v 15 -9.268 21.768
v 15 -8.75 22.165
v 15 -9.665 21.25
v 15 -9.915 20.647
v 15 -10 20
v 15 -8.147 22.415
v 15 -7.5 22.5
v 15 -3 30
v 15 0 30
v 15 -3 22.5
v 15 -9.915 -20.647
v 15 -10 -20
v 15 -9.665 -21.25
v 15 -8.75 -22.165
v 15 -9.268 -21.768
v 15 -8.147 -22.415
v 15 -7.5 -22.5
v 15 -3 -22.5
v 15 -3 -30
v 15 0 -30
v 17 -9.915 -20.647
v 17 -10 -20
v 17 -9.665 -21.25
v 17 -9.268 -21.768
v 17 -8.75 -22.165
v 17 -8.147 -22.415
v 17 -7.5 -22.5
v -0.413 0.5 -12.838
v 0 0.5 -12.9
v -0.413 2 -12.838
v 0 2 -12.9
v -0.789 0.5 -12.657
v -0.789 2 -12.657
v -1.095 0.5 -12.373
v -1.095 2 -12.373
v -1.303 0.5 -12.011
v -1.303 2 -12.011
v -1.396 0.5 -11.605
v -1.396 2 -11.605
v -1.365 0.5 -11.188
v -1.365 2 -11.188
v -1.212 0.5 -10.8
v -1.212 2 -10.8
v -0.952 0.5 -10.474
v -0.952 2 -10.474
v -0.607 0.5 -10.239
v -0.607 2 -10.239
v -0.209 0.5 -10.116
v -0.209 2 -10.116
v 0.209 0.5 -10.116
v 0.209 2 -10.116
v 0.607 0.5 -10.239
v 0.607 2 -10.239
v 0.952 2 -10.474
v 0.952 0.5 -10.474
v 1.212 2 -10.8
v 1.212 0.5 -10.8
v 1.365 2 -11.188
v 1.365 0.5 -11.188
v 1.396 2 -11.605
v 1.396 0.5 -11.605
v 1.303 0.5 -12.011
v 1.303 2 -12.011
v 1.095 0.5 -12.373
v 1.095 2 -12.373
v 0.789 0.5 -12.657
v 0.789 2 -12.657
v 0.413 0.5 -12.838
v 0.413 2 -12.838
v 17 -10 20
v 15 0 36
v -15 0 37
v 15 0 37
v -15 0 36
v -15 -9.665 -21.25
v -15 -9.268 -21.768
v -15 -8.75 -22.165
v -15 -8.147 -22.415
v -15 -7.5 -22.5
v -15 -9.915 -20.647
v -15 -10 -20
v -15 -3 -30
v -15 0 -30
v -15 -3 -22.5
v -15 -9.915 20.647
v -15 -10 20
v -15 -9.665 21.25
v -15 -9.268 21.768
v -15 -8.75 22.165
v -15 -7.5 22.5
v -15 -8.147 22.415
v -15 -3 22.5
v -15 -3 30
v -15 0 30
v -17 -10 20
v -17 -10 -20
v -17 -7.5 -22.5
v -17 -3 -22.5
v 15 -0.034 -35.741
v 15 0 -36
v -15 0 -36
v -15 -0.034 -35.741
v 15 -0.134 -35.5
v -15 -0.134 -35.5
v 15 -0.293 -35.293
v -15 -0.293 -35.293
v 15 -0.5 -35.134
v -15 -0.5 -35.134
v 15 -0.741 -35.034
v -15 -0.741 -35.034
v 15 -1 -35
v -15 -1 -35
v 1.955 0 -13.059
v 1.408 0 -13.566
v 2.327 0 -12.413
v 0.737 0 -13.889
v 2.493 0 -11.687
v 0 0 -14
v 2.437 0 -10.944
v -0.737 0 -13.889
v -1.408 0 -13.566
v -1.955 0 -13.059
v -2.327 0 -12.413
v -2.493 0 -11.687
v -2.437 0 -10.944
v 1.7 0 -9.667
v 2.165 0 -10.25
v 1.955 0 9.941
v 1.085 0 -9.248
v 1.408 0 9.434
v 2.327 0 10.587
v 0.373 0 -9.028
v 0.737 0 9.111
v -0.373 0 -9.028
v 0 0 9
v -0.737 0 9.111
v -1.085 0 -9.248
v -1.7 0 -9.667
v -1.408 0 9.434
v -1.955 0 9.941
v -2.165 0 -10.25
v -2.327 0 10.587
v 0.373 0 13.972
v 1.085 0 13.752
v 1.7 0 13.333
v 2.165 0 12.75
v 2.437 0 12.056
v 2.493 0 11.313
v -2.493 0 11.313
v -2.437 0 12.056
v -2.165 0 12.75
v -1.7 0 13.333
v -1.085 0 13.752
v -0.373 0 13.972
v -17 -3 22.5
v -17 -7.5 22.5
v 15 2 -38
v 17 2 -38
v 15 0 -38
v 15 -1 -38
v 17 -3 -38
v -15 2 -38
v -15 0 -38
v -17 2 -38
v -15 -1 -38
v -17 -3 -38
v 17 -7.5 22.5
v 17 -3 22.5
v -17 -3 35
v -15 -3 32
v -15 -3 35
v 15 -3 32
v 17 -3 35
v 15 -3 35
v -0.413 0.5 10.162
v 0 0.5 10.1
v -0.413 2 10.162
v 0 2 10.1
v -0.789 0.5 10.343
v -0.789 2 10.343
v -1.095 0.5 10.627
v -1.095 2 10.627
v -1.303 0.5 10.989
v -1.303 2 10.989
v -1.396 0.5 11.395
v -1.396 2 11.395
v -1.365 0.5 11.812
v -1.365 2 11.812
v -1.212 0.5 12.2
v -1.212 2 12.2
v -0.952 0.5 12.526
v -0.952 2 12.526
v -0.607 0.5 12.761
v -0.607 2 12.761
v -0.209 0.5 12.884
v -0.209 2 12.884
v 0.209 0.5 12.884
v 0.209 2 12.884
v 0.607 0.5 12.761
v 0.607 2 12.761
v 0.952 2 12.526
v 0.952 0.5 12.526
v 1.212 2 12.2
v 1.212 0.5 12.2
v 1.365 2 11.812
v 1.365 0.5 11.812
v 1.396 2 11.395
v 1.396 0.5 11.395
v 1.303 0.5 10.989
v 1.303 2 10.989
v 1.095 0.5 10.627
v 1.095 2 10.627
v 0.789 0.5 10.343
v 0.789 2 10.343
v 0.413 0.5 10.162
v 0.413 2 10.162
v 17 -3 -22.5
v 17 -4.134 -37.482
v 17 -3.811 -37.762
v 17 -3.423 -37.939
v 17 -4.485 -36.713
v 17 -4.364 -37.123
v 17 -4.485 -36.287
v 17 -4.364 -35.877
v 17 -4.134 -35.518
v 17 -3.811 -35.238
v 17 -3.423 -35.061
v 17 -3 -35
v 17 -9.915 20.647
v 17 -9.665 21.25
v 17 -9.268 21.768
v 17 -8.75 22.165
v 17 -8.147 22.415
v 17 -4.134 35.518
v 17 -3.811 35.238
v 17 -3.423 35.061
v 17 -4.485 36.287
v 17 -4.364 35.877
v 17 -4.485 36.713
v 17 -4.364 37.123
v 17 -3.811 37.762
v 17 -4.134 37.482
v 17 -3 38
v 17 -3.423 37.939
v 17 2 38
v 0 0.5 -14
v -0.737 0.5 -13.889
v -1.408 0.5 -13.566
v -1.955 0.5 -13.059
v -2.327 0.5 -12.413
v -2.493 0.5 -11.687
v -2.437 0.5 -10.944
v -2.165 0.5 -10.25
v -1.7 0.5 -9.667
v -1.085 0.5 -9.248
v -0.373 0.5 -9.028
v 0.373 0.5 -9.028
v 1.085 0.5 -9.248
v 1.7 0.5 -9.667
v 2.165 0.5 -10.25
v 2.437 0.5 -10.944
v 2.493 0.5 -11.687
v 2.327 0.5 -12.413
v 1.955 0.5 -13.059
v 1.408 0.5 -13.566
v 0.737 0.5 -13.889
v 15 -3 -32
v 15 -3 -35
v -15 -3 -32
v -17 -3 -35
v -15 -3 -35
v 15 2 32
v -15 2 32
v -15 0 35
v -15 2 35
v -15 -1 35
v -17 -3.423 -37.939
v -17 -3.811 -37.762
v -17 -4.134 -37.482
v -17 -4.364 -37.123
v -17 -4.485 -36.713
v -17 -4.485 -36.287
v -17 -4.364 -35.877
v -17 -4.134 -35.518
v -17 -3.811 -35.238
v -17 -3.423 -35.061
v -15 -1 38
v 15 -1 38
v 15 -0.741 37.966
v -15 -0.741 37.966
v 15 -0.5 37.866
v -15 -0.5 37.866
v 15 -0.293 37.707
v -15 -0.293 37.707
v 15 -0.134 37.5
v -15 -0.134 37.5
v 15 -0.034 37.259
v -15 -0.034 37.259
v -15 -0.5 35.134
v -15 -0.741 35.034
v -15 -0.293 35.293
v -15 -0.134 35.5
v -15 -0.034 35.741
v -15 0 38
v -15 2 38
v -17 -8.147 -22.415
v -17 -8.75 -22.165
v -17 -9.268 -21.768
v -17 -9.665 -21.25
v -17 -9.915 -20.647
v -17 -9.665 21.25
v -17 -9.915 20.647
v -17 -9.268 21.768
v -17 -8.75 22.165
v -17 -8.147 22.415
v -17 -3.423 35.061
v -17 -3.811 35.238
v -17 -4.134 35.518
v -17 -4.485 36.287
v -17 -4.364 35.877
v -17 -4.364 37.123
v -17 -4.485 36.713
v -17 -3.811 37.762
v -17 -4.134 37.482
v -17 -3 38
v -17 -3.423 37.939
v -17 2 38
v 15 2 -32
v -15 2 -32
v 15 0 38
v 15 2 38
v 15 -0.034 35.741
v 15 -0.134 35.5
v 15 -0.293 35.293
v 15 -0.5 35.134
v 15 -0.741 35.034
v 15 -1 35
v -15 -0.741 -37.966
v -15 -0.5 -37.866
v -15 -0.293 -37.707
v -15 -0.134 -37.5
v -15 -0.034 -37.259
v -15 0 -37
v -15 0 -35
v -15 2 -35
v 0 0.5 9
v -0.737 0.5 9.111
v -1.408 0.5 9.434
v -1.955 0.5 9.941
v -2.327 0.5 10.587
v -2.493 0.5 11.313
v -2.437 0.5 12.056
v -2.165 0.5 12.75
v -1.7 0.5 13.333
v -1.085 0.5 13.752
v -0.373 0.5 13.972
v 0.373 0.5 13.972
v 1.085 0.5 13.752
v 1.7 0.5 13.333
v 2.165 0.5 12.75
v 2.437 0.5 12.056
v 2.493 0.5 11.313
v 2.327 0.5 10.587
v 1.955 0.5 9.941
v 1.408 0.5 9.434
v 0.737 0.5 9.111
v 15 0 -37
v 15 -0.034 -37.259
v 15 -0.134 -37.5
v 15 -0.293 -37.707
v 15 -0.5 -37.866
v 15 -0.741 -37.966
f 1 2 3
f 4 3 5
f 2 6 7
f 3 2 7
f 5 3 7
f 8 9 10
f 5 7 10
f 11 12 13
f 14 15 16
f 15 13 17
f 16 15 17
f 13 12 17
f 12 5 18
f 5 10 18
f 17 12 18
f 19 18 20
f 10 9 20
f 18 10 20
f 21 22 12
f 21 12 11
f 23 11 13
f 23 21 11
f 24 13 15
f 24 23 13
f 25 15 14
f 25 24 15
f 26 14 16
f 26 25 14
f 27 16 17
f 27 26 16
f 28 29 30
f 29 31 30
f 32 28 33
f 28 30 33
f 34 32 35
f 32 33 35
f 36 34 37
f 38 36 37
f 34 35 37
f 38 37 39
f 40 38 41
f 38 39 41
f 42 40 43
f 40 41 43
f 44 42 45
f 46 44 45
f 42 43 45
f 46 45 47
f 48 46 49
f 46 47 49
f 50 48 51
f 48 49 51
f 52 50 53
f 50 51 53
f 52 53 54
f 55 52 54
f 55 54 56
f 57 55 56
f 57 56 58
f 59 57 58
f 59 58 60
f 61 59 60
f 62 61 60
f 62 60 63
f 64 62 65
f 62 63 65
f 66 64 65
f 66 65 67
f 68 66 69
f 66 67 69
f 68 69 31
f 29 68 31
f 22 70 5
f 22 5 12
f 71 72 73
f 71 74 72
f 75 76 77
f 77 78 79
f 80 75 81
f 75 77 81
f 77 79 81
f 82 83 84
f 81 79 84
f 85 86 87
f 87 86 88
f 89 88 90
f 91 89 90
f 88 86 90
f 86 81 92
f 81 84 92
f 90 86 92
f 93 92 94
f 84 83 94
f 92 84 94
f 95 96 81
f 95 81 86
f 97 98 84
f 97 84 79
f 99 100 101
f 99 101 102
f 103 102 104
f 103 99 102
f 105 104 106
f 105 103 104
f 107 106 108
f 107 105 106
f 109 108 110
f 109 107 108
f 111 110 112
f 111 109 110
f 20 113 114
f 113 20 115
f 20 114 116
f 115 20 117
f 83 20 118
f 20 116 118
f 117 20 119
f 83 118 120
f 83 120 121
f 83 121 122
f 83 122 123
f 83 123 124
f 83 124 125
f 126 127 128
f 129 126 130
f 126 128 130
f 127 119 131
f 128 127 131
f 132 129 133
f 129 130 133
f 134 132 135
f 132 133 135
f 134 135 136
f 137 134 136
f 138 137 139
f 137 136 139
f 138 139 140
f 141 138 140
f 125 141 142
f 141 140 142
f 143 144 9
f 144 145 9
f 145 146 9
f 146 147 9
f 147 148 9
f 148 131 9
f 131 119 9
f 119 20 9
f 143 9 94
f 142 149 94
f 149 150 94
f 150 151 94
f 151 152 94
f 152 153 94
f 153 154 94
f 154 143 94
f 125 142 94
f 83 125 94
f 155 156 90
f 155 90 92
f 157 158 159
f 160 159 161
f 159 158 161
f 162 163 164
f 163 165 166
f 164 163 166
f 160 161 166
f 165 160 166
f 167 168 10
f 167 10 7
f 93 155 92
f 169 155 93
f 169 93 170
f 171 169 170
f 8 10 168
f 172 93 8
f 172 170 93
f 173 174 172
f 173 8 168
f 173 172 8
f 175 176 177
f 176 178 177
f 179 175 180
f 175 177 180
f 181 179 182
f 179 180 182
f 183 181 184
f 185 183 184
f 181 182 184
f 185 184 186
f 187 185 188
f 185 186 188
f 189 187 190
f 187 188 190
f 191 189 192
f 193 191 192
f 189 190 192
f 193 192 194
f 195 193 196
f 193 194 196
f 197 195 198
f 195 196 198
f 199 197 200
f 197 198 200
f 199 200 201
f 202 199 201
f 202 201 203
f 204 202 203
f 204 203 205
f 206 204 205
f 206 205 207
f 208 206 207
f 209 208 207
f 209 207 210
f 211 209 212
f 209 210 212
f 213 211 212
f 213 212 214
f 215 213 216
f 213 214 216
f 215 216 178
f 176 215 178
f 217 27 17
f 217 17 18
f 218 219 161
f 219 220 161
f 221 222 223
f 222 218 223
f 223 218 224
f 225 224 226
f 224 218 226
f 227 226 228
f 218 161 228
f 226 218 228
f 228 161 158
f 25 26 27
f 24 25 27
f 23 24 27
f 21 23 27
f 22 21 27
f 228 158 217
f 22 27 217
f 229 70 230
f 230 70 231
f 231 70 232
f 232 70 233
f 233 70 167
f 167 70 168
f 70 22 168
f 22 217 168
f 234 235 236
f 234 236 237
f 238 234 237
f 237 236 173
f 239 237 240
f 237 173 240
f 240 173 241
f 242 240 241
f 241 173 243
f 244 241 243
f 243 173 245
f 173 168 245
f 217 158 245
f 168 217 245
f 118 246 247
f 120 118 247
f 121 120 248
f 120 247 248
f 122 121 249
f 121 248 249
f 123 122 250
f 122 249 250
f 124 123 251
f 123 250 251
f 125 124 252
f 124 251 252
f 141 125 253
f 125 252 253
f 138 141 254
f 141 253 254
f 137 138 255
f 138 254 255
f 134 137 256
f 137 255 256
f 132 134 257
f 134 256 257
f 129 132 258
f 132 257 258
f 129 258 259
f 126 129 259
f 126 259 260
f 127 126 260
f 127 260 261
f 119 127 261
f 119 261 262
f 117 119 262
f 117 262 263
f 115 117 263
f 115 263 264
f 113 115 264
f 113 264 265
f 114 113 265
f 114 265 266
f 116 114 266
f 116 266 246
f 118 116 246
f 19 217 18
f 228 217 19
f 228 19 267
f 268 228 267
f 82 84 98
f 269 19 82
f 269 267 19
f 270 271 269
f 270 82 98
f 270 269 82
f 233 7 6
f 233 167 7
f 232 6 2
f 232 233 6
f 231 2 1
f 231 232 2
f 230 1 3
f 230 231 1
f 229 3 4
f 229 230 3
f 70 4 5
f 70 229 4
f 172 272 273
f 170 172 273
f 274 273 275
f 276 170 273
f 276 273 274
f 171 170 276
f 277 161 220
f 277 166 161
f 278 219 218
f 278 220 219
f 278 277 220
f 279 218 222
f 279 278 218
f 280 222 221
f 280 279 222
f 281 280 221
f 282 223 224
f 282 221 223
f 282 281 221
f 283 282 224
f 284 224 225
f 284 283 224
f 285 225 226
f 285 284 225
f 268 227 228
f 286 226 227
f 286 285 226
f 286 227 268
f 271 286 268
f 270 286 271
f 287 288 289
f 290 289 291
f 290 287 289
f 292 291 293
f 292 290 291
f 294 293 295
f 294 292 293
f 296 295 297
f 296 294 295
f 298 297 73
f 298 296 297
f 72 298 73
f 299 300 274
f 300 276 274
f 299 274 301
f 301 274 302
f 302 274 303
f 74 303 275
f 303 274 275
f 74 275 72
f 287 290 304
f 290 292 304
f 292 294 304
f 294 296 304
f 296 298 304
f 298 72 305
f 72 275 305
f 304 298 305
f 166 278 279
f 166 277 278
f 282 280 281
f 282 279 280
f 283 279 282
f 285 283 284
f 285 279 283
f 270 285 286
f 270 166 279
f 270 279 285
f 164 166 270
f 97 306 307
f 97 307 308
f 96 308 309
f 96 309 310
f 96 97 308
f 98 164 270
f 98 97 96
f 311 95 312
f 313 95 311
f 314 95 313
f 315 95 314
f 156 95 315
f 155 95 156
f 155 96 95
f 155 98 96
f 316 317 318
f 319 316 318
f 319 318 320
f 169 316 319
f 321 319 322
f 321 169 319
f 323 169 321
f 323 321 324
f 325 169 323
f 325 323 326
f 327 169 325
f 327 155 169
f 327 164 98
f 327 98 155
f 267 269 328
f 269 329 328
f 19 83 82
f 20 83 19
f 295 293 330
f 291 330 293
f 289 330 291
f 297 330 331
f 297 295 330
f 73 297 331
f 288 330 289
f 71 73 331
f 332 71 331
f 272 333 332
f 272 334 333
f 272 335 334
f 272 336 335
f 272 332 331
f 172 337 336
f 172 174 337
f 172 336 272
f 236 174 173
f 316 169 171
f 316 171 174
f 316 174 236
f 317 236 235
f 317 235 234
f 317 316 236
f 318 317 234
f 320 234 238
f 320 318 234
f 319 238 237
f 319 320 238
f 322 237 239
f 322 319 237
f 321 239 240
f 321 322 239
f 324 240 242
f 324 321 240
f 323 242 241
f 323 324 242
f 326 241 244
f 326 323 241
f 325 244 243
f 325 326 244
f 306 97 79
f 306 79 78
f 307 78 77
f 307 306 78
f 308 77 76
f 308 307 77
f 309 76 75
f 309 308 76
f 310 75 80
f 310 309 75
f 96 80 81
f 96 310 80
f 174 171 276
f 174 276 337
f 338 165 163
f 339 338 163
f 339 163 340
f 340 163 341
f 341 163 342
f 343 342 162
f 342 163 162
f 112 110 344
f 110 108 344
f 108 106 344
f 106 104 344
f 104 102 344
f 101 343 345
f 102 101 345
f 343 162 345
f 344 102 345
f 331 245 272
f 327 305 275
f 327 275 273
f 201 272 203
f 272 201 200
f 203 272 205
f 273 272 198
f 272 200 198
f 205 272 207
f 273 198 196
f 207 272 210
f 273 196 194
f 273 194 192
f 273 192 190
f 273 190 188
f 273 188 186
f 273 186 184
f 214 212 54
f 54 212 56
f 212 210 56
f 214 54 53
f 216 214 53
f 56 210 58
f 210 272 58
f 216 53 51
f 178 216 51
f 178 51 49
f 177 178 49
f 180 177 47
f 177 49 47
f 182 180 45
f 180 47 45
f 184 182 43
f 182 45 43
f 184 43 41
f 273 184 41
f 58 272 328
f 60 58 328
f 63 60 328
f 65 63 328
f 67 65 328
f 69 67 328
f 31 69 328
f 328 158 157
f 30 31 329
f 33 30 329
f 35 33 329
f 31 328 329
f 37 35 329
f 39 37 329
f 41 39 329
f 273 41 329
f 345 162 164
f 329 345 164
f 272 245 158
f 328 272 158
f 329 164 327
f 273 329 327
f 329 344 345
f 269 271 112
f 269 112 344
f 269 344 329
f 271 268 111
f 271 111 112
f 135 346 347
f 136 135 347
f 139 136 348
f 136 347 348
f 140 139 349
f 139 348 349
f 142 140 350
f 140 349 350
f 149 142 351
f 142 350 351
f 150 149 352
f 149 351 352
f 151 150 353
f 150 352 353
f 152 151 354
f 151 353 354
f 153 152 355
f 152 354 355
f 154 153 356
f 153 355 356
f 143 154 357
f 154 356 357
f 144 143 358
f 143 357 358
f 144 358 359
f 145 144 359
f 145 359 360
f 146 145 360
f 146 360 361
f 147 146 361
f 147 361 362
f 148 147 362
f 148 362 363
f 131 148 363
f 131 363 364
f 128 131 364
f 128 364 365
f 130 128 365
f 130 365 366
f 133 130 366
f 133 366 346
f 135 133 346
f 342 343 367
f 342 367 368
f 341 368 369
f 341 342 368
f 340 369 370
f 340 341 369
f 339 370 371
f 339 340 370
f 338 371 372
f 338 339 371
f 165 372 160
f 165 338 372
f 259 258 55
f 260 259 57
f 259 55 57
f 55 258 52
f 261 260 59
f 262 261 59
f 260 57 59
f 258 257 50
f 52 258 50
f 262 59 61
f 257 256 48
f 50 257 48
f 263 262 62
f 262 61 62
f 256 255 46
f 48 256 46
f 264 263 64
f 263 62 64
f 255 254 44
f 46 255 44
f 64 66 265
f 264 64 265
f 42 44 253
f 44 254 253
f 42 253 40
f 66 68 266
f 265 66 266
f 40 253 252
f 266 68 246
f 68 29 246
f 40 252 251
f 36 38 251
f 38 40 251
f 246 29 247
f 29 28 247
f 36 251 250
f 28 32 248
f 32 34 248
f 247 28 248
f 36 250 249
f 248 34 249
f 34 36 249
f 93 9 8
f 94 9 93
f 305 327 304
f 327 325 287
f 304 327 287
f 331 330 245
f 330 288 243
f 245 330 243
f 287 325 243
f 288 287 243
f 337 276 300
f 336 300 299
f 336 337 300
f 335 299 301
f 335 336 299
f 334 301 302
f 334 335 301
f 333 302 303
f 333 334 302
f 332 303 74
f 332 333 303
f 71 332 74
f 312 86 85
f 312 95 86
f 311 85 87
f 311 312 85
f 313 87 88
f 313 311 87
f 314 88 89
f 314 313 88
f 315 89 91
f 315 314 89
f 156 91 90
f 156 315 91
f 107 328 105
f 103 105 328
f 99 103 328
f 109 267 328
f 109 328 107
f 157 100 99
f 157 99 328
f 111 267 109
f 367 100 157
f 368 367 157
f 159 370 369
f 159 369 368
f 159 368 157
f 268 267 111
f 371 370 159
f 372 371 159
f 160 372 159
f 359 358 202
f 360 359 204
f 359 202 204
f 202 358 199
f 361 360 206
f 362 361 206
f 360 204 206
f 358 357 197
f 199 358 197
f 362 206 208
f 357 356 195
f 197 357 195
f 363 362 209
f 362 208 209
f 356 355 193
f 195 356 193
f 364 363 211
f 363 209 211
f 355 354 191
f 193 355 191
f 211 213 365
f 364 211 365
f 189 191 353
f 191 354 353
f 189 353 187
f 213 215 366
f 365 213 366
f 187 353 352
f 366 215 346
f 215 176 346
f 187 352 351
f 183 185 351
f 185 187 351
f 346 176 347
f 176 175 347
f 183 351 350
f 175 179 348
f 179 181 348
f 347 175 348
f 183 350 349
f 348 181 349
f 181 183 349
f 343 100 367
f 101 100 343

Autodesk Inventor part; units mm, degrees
ref_plane "YZ Plane" through (0, 0, 0) normal (1, 0, 0) x (0, 1, 0)
ref_plane "XZ Plane" through (0, 0, 0) normal (0, 1, 0) x (-1, 0, 0)
ref_plane "XY Plane" through (0, 0, 0) normal (0, 0, 1) x (1, 0, 0)
sketch "Sketch1" plane through (0, 0, 0) normal (0, 1, 0) x (-1, 0, 0)
  line L0 (15, 30) -> (-15, 30)
  line L1 (-15, 30) -> (-15, -30)
  line L2 (-15, -30) -> (15, -30)
  line L3 (15, -30) -> (15, 30)
  line L4 (0, 11.5) -> (-15, 11.5)
  line L5 (-15, 11.5) -> (-15, -11.5)
  line L6 (-15, -11.5) -> (0, -11.5)
  line L7 (0, -11.5) -> (0, 11.5)
  point P0 (0, 0)
  dimension "d0" = 30
  dimension "d1" = 60
  dimension "d2" = 30
  dimension "d3" = 15
  dimension "d4" = 23
  dimension "d5" = 18.5
extrude "Extrusion1" add sketch "Sketch1" along normal blind 2
hole "Hole1" at (0, 0, -11.5) at (0, 0, 11.5) direction (0, 1, 0) diameter 2.8 end through all counterbore diameter 5 counterbore depth 0.5
sketch "Sketch2" plane through (0, 0, 0) normal (0, -1, 0) x (1, 0, 0)
  line L0 (17, 32) -> (-17, 32)
  line L1 (-17, 32) -> (-17, -32)
  line L2 (-17, -32) -> (17, -32)
  line L3 (17, -32) -> (17, 32)
  line L4 (15, 30) -> (15, -30) projected
  line L5 (-15, -30) -> (-15, 30) projected
  line L6 (15, 30) -> (-15, 30)
  line L7 (-15, 30) -> (-15, -30)
  line L8 (-15, -30) -> (15, -30)
  line L9 (15, -30) -> (15, 30)
  point P0 (0, 0)
  point P1 (-15, 30)
  dimension "d15" = 34
  dimension "d16" = 64
  dimension "d17" = 32
  dimension "d18" = 17
extrude "Extrusion2" add sketch "Sketch2" along normal blind 3 and the other way blind 2
sketch "Sketch3" plane through (-17, -3, -32) normal (-1, 0, 0) x (0, 0, 1)
  line L0 (2, 0) -> (62, 0) projected
  line L1 (54.5, 0) -> (9.5, 0)
  line L2 (9.5, 0) -> (9.5, -7)
  line L3 (9.5, -7) -> (54.5, -7)
  line L4 (54.5, -7) -> (54.5, 0)
  line L5 (2, 3) -> (62, 3) projected
  line L6 (64, 0) -> (64, 5) projected
  circle A0 centre (52, -4.5) radius 2.5
  circle A1 centre (12, -4.5) radius 2.5
  point P0 (32, 3)
  point P1 (52, -7)
  point P2 (54.5, -4.5)
  point P3 (9.5, 0)
  point P4 (9.5, -4.5)
  point P5 (12, -7)
  dimension "d23" = 10
  dimension "d24" = 45
  dimension "d25" = 9.5
  dimension "d26" = 5
  dimension "d27" = 5
  dimension "d28" = 2.5
  dimension "d29" = 2.5
extrude "Extrusion3" add sketch "Sketch3" against normal up to surface (2 mm away) contours L0 L4 A0 L3 A1 L2 | A1 | A0
mirror "Mirror1" about plane through (0, 0, 0) normal (1, 0, 0) of "Extrusion3"
sketch "Sketch6" plane through (0, -3, 0) normal (0, -1, 0) x (1, 0, 0)
  line L0 (15, 30) -> (-15, 30)
  line L1 (-15, 30) -> (-15, 35)
  line L2 (-15, 35) -> (15, 35)
  line L3 (15, 35) -> (15, 30)
  line L4 (17, 32) -> (-17, 32) projected
  line L5 (17, 32) -> (-17, 32)
  line L6 (-17, 32) -> (-17, 38)
  line L7 (-17, 38) -> (17, 38)
  line L8 (17, 38) -> (17, 32)
  point P0 (0, 0)
  point P1 (15, 32)
  point P2 (-15, 32)
  dimension "d34" = 3
  dimension "d35" = 6
extrude "Extrusion4" add sketch "Sketch6" against normal up to surface (5 mm away) contours L3 L2 L1 L4 L6 L7 L8
sketch "Sketch7" plane through (0, 2, 0) normal (0, 1, 0) x (1, 0, 0)
  line L0 (-15, -35) -> (15, -35) projected
  line L1 (17, -38) -> (-17, -38) projected
  line L2 (15, -35) -> (-14.9996, -35)
  line L3 (-14.9996, -35) -> (-14.9996, -38)
  line L4 (-14.9996, -38) -> (15, -38)
  line L5 (15, -38) -> (15, -35)
  point P0 (0, 0)
extrude "Extrusion5" cut sketch "Sketch7" against normal blind 2
sketch "Sketch8" plane through (-17, -3, -32) normal (-1, 0, 0) x (0, 0, 1)
  line L0 (70, 0) -> (54.5, 0) projected
  circle A0 centre (68.5, 0) radius 1.5
  point P0 (32, 3)
  point P1 (67, 0)
  dimension "d41" = 3
extrude "Extrusion6" add sketch "Sketch8" against normal up to surface (34 mm away) contours A0 L0 picked at (68.5603, -0.4964)
mirror "Mirror2" about plane through (0, 0, 0) normal (0, 0, 1) of "Extrusion4", "Extrusion5", "Extrusion6"
fillet "Fillet2" radius 1 4 edges at (0.0002, 0, -38) (0.0002, 0, -35) (0.0002, 0, 38) (0.0002, 0, 35)
equation "\"d2\" = 0.5 * d1"
equation "\"d3\" = 0.5 * d0"
equation "\"d5\" = -0.5 * d4 + 0.5 * d1"
equation "\"d17\" = 0.5 * d16"
equation "\"d18\" = 0.5 * d15"
properties part number "Battery_holder_2"
